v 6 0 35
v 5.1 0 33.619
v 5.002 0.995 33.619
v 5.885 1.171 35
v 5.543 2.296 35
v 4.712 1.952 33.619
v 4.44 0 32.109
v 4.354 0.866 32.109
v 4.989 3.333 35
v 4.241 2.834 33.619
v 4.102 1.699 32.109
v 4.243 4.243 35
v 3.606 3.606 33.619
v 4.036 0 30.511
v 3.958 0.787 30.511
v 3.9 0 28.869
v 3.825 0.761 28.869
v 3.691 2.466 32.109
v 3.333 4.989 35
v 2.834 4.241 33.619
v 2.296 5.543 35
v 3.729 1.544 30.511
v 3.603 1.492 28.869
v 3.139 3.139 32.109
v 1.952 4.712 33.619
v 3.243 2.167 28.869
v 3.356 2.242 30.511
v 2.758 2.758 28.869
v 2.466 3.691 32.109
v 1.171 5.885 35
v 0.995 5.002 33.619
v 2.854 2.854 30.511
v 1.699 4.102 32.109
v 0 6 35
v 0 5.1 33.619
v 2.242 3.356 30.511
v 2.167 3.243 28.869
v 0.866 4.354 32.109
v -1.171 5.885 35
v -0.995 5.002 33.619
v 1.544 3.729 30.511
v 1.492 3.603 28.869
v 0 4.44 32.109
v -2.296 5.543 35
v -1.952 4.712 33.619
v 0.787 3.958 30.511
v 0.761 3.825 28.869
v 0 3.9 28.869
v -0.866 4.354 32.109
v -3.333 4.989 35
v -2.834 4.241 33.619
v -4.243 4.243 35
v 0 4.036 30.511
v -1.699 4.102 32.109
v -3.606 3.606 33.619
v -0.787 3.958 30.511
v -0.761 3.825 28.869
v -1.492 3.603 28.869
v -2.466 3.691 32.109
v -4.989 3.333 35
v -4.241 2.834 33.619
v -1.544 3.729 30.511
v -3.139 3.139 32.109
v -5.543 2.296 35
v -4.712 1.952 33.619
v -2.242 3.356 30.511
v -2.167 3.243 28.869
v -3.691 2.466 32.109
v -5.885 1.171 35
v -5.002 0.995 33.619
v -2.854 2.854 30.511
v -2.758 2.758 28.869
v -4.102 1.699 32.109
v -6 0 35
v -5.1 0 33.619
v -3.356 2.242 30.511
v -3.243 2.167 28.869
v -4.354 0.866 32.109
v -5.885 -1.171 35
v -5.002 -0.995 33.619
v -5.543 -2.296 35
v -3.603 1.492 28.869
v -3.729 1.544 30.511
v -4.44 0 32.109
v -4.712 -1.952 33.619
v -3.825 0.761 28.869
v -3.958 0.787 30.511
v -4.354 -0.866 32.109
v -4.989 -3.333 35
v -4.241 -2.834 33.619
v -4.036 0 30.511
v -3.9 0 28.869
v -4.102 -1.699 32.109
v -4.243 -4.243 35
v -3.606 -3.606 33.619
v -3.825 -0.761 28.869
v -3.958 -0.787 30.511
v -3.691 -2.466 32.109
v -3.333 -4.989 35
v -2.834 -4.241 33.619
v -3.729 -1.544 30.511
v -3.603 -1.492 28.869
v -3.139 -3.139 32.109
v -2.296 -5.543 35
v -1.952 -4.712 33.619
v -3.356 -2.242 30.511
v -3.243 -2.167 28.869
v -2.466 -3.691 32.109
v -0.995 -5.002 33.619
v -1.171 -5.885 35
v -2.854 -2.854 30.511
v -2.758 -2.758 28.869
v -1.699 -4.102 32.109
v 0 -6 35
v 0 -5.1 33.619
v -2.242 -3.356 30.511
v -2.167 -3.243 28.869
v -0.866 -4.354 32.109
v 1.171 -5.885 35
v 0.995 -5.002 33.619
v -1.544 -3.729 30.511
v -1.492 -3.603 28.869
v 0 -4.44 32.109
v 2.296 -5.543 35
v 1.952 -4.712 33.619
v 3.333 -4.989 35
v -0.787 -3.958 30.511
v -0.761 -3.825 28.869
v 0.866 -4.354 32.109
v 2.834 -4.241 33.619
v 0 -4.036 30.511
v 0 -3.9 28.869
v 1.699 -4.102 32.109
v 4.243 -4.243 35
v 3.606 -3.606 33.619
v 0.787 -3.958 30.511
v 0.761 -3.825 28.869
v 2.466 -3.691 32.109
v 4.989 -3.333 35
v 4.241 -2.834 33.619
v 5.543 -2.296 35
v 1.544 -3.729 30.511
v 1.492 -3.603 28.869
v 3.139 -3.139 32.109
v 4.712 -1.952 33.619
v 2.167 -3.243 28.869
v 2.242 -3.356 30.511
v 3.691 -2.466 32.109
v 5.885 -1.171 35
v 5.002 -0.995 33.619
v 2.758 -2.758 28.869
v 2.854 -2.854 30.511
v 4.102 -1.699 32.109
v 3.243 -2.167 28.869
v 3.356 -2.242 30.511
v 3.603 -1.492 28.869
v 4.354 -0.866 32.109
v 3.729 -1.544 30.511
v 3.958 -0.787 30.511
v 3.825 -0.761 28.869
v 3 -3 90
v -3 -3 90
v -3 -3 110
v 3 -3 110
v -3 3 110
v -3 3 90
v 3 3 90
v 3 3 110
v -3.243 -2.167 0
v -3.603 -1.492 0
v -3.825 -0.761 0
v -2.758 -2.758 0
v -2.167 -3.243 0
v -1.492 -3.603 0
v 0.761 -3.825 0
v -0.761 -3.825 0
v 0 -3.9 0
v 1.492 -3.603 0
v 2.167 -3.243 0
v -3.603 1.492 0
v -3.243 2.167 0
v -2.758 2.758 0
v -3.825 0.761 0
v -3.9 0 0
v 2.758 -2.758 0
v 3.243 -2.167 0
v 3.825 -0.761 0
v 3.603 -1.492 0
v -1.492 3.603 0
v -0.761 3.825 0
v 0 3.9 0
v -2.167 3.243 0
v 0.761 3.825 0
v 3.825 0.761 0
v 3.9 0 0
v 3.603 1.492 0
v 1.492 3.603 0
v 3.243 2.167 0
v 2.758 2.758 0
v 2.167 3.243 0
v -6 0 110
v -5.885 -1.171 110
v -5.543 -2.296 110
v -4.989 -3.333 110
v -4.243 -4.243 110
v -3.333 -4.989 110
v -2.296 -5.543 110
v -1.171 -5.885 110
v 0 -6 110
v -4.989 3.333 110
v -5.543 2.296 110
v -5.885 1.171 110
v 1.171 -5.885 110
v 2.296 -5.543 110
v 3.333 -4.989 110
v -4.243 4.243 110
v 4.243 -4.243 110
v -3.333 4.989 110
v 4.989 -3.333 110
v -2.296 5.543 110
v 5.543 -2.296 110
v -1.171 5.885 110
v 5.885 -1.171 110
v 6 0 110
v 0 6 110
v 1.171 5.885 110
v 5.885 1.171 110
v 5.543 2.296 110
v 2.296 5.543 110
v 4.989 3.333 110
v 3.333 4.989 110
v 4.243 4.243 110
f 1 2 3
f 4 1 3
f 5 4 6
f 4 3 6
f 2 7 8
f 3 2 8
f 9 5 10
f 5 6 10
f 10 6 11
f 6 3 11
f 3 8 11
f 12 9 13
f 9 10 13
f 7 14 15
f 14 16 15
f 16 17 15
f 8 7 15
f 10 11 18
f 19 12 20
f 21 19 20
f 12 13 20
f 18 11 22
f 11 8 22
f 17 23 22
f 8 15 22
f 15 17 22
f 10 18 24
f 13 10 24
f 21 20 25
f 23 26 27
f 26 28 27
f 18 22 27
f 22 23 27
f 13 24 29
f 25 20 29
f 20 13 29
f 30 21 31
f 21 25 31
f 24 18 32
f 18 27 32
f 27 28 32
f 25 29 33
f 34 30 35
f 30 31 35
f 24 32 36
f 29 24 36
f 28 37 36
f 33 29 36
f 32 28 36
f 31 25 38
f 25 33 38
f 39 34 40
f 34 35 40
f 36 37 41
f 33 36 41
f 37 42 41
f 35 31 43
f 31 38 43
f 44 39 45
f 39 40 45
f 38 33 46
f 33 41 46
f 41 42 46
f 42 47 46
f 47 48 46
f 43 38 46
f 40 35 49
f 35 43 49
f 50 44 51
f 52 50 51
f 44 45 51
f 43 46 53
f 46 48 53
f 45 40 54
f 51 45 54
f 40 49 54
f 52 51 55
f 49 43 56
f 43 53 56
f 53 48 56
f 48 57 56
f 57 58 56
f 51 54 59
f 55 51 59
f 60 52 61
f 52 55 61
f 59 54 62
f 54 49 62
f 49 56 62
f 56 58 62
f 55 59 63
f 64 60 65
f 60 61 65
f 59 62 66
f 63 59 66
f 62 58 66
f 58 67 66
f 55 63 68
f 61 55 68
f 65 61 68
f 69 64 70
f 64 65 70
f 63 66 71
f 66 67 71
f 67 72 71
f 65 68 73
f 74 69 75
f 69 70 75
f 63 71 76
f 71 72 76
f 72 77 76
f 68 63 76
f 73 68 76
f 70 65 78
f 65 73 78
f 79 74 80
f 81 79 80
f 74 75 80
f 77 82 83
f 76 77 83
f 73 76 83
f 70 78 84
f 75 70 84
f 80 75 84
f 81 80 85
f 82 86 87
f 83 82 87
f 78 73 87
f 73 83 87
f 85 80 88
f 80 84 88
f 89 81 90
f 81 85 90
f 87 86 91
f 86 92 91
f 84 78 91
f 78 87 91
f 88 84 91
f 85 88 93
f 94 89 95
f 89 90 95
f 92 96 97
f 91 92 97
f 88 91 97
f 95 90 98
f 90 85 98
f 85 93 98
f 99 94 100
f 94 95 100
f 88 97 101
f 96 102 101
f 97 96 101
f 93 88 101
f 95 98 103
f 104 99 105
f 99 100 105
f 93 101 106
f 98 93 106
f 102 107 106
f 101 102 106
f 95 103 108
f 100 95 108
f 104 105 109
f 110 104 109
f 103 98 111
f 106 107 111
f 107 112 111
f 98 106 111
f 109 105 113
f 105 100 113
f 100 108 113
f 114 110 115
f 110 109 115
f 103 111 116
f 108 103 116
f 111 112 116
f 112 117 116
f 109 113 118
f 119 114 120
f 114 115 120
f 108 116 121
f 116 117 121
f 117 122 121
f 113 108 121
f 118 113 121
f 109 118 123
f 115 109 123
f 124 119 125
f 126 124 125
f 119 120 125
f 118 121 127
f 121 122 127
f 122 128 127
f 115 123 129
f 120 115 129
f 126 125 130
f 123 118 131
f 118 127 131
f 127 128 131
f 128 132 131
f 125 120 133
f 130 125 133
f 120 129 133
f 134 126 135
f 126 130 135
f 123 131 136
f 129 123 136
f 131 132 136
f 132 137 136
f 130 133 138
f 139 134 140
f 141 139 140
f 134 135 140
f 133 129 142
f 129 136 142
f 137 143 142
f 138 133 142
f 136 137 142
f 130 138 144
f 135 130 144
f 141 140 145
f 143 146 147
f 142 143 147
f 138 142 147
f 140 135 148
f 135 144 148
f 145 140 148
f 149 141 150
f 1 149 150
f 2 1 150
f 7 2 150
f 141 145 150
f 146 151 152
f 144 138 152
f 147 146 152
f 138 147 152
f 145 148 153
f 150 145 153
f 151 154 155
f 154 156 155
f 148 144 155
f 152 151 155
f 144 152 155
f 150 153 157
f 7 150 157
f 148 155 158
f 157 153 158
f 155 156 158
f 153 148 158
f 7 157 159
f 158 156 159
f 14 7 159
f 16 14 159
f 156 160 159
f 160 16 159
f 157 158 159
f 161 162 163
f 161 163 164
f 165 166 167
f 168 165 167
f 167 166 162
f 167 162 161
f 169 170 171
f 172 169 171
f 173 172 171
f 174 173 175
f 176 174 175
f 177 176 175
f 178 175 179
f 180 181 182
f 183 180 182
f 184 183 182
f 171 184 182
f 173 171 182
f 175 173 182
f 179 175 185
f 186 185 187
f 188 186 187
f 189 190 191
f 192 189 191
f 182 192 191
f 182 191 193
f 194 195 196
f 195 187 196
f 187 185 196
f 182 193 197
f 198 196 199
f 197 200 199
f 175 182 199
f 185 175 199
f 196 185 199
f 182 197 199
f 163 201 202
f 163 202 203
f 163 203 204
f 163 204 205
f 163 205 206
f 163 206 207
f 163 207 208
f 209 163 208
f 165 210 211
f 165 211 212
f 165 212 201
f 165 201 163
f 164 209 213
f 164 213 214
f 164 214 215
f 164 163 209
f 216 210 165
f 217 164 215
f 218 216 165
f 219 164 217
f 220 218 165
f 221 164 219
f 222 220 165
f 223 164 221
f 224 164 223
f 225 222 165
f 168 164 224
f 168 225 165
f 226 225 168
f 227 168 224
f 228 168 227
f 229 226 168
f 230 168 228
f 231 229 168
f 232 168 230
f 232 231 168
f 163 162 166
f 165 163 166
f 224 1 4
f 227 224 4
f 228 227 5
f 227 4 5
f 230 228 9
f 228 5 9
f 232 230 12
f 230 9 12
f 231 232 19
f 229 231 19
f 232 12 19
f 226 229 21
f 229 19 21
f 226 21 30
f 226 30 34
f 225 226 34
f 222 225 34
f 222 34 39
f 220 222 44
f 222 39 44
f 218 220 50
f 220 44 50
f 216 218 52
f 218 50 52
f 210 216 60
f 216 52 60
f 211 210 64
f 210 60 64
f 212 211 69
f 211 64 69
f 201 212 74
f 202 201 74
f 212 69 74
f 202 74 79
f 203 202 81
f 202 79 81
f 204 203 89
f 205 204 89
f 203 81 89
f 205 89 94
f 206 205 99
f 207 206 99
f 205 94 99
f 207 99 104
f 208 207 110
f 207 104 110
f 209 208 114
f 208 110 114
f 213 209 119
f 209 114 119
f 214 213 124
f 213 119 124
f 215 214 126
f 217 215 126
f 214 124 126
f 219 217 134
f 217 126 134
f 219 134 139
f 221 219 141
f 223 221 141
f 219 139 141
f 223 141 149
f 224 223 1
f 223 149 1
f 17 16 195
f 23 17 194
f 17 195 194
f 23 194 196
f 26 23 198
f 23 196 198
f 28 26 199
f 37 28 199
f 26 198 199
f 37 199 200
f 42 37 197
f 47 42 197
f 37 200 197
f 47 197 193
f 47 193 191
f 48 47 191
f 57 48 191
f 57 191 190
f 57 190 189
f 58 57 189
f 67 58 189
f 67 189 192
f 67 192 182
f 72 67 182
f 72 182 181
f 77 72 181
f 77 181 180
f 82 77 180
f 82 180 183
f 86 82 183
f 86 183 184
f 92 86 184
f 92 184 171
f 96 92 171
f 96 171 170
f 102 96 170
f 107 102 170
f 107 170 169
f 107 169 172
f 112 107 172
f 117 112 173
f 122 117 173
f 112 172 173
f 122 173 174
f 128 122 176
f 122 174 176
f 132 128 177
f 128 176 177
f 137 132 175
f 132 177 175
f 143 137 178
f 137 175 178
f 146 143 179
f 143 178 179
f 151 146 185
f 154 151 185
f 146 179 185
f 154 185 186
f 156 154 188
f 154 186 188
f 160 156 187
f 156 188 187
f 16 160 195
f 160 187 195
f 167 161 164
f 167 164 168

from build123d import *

# Parameters (mm, degrees)
SKETCH5_R           = 3.9
BOSS_EXTRUDE4_DEPTH = 35
SKETCH6_R           = 6
BOSS_EXTRUDE5_DEPTH = 75
FILLET1_R           = 10
SKETCH7_W           = 6
SKETCH7_H           = 6
CUT_EXTRUDE1_DEPTH  = 20


with BuildPart() as part:
    # Sketch5 → Boss-Extrude4 (new body)
    with BuildSketch(Plane.XY):
        Circle(SKETCH5_R)
    extrude(amount=BOSS_EXTRUDE4_DEPTH)

    # Sketch6 → Boss-Extrude5 (add)
    with BuildSketch(Plane.XY.offset(35)):
        Circle(SKETCH6_R)
    extrude(amount=BOSS_EXTRUDE5_DEPTH)

    # Fillet1
    # the kernel refuses this fillet: 10 mm, written as the material it adds along each edge
    with BuildSketch(Plane(origin=(0, 0, 35), x_dir=(1, 0, 0), z_dir=(0, -1, 0))) as fillet1_piece_1:
        with BuildLine():
            CenterArc((13.9, -6.131068422), FILLET1_R, 142.185511494, 37.814488506)
            Line((3.9, -6.131068422), (3.7, -6.131068422))
            Line((3.7, -6.131068422), (3.7, 0))
            Line((3.7, 0), (3.9, 0.2))
            ThreePointArc((3.9, 0.2), (4.95, 0.2), (5.842, 0.122621368))
            Line((5.842, 0.122621368), (6, 0))
        make_face()
    revolve(axis=Axis((0, 0, 35), (0, 0, 1)))

    # Sketch7 → Cut-Extrude1 (cut)
    with BuildSketch(Plane.XY.offset(110)):
        Rectangle(SKETCH7_W, SKETCH7_H)
    extrude(amount=-CUT_EXTRUDE1_DEPTH, mode=Mode.SUBTRACT)


solid = part.part
